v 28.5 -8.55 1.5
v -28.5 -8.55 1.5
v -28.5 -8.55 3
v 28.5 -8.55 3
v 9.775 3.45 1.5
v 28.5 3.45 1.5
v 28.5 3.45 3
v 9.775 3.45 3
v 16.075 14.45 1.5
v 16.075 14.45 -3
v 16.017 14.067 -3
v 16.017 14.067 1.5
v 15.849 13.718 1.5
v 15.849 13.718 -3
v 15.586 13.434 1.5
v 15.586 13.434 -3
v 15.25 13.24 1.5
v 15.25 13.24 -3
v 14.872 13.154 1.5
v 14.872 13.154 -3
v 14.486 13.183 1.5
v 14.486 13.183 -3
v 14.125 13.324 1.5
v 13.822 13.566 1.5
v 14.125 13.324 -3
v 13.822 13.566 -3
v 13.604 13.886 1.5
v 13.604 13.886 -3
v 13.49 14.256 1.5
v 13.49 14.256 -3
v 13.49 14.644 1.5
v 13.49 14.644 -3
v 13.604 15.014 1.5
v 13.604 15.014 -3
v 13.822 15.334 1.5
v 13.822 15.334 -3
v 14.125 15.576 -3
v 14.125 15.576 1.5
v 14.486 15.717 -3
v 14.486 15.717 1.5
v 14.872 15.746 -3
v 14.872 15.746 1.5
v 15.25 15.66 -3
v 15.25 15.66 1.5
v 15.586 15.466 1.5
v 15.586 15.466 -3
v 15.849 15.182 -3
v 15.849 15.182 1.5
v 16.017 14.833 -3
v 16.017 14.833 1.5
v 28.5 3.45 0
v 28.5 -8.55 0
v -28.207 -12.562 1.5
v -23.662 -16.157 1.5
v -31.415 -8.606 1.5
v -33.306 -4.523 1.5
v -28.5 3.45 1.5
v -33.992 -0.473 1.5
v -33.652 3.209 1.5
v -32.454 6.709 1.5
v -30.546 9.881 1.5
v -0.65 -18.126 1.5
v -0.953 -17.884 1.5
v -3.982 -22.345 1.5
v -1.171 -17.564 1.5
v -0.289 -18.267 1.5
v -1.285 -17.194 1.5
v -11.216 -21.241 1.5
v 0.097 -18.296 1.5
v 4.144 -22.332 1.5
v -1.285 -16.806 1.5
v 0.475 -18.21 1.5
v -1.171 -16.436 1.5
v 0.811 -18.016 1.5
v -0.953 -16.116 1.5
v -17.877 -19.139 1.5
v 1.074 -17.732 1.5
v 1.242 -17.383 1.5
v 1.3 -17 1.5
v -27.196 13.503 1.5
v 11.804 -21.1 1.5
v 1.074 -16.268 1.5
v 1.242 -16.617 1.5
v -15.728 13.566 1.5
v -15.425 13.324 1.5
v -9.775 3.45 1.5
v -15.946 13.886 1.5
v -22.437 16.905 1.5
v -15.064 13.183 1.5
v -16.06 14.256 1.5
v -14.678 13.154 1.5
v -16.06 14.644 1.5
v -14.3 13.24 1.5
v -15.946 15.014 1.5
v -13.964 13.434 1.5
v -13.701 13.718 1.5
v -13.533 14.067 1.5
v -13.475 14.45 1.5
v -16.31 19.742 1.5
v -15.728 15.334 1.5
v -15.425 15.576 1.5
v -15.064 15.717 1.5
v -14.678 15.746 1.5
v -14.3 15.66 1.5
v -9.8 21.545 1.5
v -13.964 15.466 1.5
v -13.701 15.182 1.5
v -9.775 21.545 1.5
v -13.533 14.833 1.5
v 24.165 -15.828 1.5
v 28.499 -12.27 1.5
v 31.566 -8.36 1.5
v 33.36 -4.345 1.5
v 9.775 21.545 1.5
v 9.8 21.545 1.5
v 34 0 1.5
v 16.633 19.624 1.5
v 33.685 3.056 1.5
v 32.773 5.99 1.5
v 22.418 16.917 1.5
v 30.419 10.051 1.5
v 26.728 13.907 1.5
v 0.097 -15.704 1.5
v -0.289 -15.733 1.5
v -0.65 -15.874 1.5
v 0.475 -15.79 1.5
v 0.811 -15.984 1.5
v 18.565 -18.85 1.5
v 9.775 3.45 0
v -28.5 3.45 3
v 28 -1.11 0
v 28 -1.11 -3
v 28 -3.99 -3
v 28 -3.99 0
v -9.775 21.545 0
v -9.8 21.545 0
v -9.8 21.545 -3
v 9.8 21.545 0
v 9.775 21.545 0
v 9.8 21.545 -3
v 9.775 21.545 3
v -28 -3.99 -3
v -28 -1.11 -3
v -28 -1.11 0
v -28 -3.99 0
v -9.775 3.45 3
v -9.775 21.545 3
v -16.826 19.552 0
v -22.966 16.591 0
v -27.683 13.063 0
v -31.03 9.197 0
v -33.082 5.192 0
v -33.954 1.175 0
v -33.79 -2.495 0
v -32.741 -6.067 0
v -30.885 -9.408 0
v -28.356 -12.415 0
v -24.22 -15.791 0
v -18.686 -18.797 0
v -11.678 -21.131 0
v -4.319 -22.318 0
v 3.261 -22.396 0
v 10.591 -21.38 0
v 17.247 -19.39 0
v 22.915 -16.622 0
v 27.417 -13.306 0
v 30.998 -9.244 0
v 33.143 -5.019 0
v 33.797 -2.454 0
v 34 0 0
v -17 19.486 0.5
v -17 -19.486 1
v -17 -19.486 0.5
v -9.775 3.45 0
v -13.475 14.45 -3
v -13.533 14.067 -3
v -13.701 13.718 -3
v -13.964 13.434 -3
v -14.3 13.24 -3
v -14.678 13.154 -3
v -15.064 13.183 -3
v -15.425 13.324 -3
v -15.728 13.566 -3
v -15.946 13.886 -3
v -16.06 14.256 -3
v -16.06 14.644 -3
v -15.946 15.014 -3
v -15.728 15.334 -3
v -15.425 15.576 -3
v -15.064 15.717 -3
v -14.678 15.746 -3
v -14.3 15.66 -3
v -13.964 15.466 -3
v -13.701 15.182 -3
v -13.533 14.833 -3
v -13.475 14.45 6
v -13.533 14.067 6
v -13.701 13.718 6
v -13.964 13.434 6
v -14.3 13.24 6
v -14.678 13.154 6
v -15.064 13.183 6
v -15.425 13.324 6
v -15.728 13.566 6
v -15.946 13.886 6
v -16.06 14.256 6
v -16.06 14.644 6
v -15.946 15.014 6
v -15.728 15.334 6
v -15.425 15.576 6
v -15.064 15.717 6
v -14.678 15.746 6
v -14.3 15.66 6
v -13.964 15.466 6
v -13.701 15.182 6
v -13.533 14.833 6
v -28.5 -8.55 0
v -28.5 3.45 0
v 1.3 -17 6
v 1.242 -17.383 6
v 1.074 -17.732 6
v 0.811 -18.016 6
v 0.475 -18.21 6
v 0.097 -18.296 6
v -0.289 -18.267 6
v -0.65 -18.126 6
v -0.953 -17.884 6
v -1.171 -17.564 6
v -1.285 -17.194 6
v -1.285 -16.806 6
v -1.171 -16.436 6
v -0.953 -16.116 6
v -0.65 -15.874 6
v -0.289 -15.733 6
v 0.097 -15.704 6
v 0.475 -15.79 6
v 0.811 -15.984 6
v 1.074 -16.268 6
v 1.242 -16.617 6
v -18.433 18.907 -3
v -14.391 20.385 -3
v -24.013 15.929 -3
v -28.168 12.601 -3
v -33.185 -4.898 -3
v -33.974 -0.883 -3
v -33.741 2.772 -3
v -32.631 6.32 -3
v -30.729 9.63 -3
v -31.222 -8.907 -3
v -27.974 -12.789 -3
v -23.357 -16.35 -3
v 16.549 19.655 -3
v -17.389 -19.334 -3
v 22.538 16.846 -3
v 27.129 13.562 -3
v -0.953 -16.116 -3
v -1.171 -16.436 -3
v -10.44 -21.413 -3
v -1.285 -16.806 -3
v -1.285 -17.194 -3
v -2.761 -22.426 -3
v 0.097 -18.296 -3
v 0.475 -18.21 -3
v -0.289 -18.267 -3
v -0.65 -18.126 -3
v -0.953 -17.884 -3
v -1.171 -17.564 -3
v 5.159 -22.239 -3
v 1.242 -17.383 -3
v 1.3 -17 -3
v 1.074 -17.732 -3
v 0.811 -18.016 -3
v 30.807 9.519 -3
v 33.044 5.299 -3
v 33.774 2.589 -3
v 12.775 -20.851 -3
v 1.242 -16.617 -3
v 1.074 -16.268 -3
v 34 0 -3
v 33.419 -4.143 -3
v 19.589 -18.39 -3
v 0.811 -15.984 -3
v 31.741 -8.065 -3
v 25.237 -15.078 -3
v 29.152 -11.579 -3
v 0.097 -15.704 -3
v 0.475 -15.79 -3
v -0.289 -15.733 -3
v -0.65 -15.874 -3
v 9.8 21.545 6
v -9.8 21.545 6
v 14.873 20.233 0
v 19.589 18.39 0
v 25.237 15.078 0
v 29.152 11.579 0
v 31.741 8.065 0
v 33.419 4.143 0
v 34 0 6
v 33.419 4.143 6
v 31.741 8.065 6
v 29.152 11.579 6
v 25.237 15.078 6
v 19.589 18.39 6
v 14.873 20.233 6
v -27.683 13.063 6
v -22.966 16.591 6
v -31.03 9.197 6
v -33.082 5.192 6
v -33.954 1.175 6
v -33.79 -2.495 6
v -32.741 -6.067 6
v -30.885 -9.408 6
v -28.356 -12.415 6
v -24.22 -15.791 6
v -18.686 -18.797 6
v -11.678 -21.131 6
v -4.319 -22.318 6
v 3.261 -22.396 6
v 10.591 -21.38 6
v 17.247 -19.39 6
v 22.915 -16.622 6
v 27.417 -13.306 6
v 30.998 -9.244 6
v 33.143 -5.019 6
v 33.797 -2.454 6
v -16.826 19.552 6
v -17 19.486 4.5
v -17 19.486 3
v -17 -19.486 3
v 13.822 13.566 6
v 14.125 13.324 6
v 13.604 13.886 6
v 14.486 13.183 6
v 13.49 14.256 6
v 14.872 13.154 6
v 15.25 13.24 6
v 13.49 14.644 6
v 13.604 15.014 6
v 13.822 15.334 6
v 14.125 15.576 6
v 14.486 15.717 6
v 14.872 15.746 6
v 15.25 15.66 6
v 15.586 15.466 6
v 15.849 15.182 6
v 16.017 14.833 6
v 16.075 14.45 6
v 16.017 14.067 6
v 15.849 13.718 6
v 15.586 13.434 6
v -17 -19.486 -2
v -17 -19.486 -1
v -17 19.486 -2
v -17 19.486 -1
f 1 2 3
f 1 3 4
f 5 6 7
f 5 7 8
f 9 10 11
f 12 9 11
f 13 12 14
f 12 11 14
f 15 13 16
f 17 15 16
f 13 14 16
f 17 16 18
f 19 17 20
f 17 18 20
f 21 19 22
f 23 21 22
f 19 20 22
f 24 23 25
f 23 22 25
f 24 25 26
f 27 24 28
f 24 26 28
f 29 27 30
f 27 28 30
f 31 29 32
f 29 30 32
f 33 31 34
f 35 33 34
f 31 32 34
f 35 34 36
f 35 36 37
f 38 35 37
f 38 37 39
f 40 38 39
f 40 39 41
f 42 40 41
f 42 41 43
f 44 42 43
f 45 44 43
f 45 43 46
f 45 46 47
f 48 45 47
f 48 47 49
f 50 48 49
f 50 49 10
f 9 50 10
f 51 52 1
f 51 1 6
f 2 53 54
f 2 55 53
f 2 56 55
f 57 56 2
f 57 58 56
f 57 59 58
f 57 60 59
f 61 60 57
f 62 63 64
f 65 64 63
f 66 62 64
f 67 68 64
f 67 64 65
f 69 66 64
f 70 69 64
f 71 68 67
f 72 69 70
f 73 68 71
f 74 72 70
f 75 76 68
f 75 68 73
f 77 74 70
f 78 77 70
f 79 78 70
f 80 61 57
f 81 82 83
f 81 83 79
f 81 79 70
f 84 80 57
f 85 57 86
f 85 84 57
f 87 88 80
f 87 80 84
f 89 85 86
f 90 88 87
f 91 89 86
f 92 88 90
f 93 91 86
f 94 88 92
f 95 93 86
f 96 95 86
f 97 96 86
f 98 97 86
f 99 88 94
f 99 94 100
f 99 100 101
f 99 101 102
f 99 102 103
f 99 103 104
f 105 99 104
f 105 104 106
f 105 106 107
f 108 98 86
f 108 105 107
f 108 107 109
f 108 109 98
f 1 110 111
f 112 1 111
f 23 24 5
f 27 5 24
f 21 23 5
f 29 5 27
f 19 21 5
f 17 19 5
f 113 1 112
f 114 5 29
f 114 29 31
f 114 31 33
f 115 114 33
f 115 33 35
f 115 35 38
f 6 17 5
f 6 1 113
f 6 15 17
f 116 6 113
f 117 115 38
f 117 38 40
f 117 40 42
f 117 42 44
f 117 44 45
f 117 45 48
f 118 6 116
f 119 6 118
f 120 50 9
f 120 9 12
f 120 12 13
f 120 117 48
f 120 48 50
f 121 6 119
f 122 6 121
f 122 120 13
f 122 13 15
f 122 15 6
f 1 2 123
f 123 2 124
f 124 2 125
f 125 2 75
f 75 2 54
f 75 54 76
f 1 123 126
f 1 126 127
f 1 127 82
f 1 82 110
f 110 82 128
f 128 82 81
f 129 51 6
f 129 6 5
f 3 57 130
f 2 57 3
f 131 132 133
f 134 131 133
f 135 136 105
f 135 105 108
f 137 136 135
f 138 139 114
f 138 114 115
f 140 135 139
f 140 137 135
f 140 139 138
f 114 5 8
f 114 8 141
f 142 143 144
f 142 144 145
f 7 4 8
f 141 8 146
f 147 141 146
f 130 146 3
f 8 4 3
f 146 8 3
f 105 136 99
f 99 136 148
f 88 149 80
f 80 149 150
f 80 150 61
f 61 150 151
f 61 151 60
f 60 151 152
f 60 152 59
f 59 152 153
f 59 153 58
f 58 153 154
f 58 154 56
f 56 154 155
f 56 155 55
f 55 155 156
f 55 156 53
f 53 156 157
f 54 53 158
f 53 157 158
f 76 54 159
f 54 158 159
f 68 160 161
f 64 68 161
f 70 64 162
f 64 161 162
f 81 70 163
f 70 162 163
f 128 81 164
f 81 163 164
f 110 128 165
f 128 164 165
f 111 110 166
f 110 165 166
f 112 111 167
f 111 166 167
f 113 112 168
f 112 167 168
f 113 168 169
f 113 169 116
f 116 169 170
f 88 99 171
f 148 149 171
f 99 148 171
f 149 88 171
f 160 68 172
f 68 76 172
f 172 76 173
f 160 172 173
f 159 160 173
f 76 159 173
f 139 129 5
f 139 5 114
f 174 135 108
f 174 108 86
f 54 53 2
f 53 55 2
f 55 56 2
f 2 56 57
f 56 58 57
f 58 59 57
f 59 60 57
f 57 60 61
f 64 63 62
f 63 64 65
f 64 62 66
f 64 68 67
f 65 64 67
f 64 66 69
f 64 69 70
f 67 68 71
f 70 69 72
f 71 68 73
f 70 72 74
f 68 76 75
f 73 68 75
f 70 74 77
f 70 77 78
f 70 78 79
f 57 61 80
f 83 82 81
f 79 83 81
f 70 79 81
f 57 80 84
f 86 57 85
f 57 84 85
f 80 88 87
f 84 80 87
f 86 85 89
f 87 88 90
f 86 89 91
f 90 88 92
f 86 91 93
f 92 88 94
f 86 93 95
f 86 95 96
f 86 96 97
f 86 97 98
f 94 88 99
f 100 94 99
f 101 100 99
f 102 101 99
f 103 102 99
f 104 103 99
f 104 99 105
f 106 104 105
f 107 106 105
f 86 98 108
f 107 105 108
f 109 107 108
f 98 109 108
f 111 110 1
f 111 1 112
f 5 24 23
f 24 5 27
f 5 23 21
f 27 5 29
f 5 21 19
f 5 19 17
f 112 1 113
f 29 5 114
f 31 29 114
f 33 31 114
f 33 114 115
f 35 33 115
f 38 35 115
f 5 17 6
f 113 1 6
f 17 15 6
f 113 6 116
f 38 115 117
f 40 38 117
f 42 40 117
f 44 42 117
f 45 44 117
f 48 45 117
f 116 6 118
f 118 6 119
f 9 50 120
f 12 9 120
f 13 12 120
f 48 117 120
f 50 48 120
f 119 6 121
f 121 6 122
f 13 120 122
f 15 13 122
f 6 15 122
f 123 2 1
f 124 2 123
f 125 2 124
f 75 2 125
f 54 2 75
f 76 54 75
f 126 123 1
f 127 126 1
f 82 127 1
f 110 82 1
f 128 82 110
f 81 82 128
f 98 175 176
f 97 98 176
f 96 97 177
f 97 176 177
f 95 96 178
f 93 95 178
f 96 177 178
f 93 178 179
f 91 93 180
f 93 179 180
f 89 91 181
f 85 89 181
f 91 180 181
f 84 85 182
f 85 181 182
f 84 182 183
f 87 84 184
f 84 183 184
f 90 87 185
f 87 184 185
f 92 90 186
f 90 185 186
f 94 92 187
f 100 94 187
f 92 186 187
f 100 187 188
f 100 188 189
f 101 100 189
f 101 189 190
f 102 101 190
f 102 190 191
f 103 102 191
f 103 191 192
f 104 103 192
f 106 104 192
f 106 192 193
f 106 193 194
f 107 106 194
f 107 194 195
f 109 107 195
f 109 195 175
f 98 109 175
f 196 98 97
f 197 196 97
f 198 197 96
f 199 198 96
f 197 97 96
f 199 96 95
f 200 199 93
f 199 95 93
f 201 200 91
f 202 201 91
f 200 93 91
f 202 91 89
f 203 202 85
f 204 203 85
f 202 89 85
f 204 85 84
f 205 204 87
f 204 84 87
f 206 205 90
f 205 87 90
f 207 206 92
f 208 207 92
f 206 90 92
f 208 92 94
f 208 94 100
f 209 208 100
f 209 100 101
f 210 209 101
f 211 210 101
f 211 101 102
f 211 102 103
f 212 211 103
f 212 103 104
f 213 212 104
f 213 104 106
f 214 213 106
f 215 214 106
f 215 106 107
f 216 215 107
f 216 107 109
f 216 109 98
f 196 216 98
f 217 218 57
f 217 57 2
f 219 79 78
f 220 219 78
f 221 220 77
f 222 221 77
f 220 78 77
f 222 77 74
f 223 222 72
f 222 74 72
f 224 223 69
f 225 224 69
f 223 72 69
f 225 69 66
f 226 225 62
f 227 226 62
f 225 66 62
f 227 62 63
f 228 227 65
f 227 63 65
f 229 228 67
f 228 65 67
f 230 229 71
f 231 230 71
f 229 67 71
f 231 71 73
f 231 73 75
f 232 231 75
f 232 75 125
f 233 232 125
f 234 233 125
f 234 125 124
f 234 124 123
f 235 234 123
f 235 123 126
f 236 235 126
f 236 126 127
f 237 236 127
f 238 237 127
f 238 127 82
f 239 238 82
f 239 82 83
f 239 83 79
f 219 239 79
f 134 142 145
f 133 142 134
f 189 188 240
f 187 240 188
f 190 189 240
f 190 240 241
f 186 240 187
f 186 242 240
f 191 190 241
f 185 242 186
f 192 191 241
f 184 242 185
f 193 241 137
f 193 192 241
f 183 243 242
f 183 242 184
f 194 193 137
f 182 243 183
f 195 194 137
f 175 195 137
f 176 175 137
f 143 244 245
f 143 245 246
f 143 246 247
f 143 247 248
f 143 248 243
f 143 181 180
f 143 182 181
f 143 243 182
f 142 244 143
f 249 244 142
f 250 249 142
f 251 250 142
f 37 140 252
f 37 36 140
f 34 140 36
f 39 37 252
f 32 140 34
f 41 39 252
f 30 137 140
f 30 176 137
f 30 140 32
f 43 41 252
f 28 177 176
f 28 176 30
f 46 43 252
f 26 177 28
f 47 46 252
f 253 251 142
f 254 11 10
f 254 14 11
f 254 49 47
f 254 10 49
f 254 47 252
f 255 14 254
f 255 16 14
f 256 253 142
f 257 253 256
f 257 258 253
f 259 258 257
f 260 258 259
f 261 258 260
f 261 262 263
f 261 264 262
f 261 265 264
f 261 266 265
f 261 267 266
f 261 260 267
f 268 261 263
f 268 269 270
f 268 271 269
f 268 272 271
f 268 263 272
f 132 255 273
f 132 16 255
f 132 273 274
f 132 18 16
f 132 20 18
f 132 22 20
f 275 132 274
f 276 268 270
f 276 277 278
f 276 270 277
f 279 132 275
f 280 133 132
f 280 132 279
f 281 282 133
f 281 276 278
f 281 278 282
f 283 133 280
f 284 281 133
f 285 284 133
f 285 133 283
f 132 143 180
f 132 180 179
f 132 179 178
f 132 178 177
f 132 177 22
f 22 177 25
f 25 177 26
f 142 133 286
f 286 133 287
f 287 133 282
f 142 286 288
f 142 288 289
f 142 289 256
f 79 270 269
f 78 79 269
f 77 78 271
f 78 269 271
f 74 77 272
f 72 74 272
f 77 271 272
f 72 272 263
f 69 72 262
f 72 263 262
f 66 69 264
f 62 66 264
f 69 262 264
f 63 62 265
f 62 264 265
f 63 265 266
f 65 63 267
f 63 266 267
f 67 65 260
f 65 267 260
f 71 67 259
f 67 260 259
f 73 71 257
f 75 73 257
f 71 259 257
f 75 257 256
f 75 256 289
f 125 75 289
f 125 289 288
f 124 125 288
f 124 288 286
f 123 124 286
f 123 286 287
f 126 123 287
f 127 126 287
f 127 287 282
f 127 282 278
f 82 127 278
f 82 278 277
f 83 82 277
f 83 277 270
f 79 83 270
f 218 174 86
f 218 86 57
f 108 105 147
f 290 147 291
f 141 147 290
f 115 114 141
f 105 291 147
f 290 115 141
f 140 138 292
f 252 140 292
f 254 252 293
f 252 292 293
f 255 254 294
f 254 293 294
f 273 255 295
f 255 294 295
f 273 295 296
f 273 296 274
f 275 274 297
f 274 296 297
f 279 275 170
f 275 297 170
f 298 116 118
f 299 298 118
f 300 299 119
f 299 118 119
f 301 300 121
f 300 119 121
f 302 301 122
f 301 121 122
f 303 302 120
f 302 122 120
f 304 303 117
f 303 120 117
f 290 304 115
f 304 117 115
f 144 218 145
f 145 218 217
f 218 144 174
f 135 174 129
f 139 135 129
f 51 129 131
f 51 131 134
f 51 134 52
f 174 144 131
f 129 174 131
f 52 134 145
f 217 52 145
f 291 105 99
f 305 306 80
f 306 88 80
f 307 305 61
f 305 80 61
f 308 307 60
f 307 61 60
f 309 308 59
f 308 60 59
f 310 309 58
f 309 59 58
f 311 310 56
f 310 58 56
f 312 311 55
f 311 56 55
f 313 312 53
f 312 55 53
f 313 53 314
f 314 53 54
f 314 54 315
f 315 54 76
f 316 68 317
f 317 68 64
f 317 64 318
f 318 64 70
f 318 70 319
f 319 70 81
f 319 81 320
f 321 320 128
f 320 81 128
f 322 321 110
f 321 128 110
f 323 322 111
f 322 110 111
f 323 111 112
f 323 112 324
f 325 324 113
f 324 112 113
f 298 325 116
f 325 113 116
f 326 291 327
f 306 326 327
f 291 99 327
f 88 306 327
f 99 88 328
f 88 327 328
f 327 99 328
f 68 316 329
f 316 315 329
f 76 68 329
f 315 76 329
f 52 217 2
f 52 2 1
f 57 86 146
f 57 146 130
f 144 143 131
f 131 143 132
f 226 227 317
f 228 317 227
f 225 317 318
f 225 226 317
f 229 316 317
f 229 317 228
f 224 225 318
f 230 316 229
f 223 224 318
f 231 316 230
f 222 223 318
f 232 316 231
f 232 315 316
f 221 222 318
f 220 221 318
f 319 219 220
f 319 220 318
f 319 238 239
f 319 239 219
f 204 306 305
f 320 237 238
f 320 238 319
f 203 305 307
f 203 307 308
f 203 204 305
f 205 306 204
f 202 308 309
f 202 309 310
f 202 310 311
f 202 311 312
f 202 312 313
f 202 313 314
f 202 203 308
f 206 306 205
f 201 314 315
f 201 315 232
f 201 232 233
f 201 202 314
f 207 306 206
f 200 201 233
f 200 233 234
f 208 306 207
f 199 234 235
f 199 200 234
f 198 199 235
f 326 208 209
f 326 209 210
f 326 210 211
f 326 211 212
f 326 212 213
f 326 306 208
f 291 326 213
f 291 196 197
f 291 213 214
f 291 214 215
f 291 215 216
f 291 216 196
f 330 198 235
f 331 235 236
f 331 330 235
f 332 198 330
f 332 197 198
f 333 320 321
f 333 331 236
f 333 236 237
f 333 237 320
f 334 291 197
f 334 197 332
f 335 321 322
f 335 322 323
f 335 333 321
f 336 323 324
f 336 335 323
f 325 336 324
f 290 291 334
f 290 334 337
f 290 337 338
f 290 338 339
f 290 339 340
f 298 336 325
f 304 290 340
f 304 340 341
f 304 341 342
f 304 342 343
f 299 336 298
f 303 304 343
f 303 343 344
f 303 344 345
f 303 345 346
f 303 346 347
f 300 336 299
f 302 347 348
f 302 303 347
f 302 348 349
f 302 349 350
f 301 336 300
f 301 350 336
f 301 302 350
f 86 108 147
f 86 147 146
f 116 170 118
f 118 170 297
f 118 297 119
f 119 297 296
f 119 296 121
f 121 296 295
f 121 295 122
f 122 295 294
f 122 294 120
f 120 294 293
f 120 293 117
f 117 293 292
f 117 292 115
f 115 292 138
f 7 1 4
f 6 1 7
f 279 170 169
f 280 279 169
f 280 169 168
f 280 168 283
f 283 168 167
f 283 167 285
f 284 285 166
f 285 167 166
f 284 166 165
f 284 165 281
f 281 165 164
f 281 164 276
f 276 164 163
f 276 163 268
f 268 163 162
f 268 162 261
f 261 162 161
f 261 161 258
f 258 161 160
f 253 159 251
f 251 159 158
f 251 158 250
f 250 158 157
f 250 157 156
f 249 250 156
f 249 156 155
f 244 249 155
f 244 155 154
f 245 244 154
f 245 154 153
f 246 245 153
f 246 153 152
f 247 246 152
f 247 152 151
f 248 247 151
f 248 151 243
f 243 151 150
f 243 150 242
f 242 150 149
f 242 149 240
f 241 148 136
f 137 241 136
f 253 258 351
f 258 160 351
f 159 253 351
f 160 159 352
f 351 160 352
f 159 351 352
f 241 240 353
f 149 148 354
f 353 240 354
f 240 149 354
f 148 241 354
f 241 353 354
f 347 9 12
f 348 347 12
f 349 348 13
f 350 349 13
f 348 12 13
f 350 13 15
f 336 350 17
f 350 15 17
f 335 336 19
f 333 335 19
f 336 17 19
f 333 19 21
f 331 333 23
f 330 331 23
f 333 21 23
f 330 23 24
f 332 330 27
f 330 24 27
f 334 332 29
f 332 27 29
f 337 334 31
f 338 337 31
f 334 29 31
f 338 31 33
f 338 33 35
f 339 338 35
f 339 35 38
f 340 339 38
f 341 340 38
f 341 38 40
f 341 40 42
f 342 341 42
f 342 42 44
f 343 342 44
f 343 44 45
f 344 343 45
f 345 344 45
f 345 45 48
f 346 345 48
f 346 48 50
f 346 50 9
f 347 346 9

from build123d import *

# Parameters (mm, degrees)
BOX_BOTTOM_HALF_0_W     = 69.994952
BOX_BOTTOM_HALF_0_H     = 46.031044
BOX_BOTTOM_HALF_0_DEPTH = 5.5
PAD_DEPTH               = 6
POCKET_DEPTH            = 3
PAD001_DEPTH            = 3
SKETCH003_W             = 56
SKETCH003_H             = 2.88
POCKET001_DEPTH         = 3
SKETCH004_W             = 19.6
SKETCH004_H             = 1
POCKET002_DEPTH         = 9.001
SKETCH005_R             = 1.3
POCKET003_DEPTH         = 9.001


with BuildPart() as box_bottom_half_0_body:
    # box_bottom_half_0 → box_bottom_half_0 (new body)
    with BuildSketch(Plane(origin=(-34.994952, -23.485952, -4), x_dir=(1, 0, 0), z_dir=(0, 0, 1))):
        with Locations((34.997476, 23.015522)):
            Rectangle(BOX_BOTTOM_HALF_0_W, BOX_BOTTOM_HALF_0_H)
    extrude(amount=BOX_BOTTOM_HALF_0_DEPTH)


with BuildPart() as body:
    # Sketch → Pad (new body)
    with BuildSketch(Plane.XY):
        with BuildLine():
            add(Edge.make_bspline(
                [(34, 0), (34, 38.971143), (-17, 19.485572), (-68, 0), (-17, -19.485572), (34, -38.971143), (34, 0)],
                knots=[0, 0, 0, 2.094395, 2.094395, 4.18879, 4.18879, 6.283185, 6.283185, 6.283185], degree=2, weights=[1, 0.5, 1, 0.5, 1, 0.5, 1]))
        make_face()
    extrude(amount=PAD_DEPTH)

    # Sketch001 (on Face2 of Pad) → Pocket (cut)
    with BuildSketch(Plane(origin=(0, 0, 0), x_dir=(1, 0, 0), z_dir=(0, 0, -1))):
        Polygon((9.775, -3.450064), (9.775, -21.550064), (-9.775, -21.550064), (-9.775, -3.450064), (-28.5, -3.450064), (-28.5, 8.549936), (28.5, 8.549936), (28.5, -3.450064), align=None)
    extrude(amount=-POCKET_DEPTH, mode=Mode.SUBTRACT)

    # Sketch002 (on Face2 of Pocket) → Pad001 (join)
    with BuildSketch(Plane(origin=(0, 0, 0), x_dir=(1, 0, 0), z_dir=(0, 0, -1))):
        with BuildLine():
            add(Edge.make_bspline(
                [(34, 0), (34, 38.971143), (-17, 19.485572), (-68, 0), (-17, -19.485572), (34, -38.971143), (34, 0)],
                knots=[0, 0, 0, 2.094395, 2.094395, 4.18879, 4.18879, 6.283185, 6.283185, 6.283185], degree=2, weights=[1, 0.5, 1, 0.5, 1, 0.5, 1]))
        make_face()
    extrude(amount=PAD001_DEPTH)

    # Sketch003 (on Face4 of Pad001) → Pocket001 (cut)
    with BuildSketch(Plane(origin=(0, 0, -3), x_dir=(1, 0, 0), z_dir=(0, 0, -1))):
        with Locations((0, 2.549936)):
            Rectangle(SKETCH003_W, SKETCH003_H)
    extrude(amount=-POCKET001_DEPTH, mode=Mode.SUBTRACT)

    # Sketch004 (on Face4 of Pocket001) → Pocket002 (cut, through all)
    with BuildSketch(Plane(origin=(0, 0, -3), x_dir=(1, 0, 0), z_dir=(0, 0, -1))):
        with Locations((0, -22.045091)):
            Rectangle(SKETCH004_W, SKETCH004_H)
    extrude(amount=-POCKET002_DEPTH, mode=Mode.SUBTRACT)

    # Sketch005 (on Face7 of Pocket002) → Pocket003 (cut, through all)
    with BuildSketch(Plane(origin=(0, 0, -3), x_dir=(1, 0, 0), z_dir=(0, 0, -1))):
        with Locations((-14.775, -14.450064)):
            Circle(SKETCH005_R)
        with Locations((0, 17)):
            Circle(SKETCH005_R)
        with Locations((14.775, -14.450064)):
            Circle(SKETCH005_R)
    extrude(amount=-POCKET003_DEPTH, mode=Mode.SUBTRACT)


with BuildPart() as bottom_half_0_body:
    # bottom_half_0 base: copy of Body
    add(body.part)

    # bottom_half_0: intersect box_bottom_half_0 body
    add(box_bottom_half_0_body.part, mode=Mode.INTERSECT)


with BuildPart() as top_half_0_body:
    # top_half_0 base: copy of Body
    add(body.part)

    # top_half_0: cut box_bottom_half_0 body
    add(box_bottom_half_0_body.part, mode=Mode.SUBTRACT)


solid = Compound([bottom_half_0_body.part, top_half_0_body.part])
